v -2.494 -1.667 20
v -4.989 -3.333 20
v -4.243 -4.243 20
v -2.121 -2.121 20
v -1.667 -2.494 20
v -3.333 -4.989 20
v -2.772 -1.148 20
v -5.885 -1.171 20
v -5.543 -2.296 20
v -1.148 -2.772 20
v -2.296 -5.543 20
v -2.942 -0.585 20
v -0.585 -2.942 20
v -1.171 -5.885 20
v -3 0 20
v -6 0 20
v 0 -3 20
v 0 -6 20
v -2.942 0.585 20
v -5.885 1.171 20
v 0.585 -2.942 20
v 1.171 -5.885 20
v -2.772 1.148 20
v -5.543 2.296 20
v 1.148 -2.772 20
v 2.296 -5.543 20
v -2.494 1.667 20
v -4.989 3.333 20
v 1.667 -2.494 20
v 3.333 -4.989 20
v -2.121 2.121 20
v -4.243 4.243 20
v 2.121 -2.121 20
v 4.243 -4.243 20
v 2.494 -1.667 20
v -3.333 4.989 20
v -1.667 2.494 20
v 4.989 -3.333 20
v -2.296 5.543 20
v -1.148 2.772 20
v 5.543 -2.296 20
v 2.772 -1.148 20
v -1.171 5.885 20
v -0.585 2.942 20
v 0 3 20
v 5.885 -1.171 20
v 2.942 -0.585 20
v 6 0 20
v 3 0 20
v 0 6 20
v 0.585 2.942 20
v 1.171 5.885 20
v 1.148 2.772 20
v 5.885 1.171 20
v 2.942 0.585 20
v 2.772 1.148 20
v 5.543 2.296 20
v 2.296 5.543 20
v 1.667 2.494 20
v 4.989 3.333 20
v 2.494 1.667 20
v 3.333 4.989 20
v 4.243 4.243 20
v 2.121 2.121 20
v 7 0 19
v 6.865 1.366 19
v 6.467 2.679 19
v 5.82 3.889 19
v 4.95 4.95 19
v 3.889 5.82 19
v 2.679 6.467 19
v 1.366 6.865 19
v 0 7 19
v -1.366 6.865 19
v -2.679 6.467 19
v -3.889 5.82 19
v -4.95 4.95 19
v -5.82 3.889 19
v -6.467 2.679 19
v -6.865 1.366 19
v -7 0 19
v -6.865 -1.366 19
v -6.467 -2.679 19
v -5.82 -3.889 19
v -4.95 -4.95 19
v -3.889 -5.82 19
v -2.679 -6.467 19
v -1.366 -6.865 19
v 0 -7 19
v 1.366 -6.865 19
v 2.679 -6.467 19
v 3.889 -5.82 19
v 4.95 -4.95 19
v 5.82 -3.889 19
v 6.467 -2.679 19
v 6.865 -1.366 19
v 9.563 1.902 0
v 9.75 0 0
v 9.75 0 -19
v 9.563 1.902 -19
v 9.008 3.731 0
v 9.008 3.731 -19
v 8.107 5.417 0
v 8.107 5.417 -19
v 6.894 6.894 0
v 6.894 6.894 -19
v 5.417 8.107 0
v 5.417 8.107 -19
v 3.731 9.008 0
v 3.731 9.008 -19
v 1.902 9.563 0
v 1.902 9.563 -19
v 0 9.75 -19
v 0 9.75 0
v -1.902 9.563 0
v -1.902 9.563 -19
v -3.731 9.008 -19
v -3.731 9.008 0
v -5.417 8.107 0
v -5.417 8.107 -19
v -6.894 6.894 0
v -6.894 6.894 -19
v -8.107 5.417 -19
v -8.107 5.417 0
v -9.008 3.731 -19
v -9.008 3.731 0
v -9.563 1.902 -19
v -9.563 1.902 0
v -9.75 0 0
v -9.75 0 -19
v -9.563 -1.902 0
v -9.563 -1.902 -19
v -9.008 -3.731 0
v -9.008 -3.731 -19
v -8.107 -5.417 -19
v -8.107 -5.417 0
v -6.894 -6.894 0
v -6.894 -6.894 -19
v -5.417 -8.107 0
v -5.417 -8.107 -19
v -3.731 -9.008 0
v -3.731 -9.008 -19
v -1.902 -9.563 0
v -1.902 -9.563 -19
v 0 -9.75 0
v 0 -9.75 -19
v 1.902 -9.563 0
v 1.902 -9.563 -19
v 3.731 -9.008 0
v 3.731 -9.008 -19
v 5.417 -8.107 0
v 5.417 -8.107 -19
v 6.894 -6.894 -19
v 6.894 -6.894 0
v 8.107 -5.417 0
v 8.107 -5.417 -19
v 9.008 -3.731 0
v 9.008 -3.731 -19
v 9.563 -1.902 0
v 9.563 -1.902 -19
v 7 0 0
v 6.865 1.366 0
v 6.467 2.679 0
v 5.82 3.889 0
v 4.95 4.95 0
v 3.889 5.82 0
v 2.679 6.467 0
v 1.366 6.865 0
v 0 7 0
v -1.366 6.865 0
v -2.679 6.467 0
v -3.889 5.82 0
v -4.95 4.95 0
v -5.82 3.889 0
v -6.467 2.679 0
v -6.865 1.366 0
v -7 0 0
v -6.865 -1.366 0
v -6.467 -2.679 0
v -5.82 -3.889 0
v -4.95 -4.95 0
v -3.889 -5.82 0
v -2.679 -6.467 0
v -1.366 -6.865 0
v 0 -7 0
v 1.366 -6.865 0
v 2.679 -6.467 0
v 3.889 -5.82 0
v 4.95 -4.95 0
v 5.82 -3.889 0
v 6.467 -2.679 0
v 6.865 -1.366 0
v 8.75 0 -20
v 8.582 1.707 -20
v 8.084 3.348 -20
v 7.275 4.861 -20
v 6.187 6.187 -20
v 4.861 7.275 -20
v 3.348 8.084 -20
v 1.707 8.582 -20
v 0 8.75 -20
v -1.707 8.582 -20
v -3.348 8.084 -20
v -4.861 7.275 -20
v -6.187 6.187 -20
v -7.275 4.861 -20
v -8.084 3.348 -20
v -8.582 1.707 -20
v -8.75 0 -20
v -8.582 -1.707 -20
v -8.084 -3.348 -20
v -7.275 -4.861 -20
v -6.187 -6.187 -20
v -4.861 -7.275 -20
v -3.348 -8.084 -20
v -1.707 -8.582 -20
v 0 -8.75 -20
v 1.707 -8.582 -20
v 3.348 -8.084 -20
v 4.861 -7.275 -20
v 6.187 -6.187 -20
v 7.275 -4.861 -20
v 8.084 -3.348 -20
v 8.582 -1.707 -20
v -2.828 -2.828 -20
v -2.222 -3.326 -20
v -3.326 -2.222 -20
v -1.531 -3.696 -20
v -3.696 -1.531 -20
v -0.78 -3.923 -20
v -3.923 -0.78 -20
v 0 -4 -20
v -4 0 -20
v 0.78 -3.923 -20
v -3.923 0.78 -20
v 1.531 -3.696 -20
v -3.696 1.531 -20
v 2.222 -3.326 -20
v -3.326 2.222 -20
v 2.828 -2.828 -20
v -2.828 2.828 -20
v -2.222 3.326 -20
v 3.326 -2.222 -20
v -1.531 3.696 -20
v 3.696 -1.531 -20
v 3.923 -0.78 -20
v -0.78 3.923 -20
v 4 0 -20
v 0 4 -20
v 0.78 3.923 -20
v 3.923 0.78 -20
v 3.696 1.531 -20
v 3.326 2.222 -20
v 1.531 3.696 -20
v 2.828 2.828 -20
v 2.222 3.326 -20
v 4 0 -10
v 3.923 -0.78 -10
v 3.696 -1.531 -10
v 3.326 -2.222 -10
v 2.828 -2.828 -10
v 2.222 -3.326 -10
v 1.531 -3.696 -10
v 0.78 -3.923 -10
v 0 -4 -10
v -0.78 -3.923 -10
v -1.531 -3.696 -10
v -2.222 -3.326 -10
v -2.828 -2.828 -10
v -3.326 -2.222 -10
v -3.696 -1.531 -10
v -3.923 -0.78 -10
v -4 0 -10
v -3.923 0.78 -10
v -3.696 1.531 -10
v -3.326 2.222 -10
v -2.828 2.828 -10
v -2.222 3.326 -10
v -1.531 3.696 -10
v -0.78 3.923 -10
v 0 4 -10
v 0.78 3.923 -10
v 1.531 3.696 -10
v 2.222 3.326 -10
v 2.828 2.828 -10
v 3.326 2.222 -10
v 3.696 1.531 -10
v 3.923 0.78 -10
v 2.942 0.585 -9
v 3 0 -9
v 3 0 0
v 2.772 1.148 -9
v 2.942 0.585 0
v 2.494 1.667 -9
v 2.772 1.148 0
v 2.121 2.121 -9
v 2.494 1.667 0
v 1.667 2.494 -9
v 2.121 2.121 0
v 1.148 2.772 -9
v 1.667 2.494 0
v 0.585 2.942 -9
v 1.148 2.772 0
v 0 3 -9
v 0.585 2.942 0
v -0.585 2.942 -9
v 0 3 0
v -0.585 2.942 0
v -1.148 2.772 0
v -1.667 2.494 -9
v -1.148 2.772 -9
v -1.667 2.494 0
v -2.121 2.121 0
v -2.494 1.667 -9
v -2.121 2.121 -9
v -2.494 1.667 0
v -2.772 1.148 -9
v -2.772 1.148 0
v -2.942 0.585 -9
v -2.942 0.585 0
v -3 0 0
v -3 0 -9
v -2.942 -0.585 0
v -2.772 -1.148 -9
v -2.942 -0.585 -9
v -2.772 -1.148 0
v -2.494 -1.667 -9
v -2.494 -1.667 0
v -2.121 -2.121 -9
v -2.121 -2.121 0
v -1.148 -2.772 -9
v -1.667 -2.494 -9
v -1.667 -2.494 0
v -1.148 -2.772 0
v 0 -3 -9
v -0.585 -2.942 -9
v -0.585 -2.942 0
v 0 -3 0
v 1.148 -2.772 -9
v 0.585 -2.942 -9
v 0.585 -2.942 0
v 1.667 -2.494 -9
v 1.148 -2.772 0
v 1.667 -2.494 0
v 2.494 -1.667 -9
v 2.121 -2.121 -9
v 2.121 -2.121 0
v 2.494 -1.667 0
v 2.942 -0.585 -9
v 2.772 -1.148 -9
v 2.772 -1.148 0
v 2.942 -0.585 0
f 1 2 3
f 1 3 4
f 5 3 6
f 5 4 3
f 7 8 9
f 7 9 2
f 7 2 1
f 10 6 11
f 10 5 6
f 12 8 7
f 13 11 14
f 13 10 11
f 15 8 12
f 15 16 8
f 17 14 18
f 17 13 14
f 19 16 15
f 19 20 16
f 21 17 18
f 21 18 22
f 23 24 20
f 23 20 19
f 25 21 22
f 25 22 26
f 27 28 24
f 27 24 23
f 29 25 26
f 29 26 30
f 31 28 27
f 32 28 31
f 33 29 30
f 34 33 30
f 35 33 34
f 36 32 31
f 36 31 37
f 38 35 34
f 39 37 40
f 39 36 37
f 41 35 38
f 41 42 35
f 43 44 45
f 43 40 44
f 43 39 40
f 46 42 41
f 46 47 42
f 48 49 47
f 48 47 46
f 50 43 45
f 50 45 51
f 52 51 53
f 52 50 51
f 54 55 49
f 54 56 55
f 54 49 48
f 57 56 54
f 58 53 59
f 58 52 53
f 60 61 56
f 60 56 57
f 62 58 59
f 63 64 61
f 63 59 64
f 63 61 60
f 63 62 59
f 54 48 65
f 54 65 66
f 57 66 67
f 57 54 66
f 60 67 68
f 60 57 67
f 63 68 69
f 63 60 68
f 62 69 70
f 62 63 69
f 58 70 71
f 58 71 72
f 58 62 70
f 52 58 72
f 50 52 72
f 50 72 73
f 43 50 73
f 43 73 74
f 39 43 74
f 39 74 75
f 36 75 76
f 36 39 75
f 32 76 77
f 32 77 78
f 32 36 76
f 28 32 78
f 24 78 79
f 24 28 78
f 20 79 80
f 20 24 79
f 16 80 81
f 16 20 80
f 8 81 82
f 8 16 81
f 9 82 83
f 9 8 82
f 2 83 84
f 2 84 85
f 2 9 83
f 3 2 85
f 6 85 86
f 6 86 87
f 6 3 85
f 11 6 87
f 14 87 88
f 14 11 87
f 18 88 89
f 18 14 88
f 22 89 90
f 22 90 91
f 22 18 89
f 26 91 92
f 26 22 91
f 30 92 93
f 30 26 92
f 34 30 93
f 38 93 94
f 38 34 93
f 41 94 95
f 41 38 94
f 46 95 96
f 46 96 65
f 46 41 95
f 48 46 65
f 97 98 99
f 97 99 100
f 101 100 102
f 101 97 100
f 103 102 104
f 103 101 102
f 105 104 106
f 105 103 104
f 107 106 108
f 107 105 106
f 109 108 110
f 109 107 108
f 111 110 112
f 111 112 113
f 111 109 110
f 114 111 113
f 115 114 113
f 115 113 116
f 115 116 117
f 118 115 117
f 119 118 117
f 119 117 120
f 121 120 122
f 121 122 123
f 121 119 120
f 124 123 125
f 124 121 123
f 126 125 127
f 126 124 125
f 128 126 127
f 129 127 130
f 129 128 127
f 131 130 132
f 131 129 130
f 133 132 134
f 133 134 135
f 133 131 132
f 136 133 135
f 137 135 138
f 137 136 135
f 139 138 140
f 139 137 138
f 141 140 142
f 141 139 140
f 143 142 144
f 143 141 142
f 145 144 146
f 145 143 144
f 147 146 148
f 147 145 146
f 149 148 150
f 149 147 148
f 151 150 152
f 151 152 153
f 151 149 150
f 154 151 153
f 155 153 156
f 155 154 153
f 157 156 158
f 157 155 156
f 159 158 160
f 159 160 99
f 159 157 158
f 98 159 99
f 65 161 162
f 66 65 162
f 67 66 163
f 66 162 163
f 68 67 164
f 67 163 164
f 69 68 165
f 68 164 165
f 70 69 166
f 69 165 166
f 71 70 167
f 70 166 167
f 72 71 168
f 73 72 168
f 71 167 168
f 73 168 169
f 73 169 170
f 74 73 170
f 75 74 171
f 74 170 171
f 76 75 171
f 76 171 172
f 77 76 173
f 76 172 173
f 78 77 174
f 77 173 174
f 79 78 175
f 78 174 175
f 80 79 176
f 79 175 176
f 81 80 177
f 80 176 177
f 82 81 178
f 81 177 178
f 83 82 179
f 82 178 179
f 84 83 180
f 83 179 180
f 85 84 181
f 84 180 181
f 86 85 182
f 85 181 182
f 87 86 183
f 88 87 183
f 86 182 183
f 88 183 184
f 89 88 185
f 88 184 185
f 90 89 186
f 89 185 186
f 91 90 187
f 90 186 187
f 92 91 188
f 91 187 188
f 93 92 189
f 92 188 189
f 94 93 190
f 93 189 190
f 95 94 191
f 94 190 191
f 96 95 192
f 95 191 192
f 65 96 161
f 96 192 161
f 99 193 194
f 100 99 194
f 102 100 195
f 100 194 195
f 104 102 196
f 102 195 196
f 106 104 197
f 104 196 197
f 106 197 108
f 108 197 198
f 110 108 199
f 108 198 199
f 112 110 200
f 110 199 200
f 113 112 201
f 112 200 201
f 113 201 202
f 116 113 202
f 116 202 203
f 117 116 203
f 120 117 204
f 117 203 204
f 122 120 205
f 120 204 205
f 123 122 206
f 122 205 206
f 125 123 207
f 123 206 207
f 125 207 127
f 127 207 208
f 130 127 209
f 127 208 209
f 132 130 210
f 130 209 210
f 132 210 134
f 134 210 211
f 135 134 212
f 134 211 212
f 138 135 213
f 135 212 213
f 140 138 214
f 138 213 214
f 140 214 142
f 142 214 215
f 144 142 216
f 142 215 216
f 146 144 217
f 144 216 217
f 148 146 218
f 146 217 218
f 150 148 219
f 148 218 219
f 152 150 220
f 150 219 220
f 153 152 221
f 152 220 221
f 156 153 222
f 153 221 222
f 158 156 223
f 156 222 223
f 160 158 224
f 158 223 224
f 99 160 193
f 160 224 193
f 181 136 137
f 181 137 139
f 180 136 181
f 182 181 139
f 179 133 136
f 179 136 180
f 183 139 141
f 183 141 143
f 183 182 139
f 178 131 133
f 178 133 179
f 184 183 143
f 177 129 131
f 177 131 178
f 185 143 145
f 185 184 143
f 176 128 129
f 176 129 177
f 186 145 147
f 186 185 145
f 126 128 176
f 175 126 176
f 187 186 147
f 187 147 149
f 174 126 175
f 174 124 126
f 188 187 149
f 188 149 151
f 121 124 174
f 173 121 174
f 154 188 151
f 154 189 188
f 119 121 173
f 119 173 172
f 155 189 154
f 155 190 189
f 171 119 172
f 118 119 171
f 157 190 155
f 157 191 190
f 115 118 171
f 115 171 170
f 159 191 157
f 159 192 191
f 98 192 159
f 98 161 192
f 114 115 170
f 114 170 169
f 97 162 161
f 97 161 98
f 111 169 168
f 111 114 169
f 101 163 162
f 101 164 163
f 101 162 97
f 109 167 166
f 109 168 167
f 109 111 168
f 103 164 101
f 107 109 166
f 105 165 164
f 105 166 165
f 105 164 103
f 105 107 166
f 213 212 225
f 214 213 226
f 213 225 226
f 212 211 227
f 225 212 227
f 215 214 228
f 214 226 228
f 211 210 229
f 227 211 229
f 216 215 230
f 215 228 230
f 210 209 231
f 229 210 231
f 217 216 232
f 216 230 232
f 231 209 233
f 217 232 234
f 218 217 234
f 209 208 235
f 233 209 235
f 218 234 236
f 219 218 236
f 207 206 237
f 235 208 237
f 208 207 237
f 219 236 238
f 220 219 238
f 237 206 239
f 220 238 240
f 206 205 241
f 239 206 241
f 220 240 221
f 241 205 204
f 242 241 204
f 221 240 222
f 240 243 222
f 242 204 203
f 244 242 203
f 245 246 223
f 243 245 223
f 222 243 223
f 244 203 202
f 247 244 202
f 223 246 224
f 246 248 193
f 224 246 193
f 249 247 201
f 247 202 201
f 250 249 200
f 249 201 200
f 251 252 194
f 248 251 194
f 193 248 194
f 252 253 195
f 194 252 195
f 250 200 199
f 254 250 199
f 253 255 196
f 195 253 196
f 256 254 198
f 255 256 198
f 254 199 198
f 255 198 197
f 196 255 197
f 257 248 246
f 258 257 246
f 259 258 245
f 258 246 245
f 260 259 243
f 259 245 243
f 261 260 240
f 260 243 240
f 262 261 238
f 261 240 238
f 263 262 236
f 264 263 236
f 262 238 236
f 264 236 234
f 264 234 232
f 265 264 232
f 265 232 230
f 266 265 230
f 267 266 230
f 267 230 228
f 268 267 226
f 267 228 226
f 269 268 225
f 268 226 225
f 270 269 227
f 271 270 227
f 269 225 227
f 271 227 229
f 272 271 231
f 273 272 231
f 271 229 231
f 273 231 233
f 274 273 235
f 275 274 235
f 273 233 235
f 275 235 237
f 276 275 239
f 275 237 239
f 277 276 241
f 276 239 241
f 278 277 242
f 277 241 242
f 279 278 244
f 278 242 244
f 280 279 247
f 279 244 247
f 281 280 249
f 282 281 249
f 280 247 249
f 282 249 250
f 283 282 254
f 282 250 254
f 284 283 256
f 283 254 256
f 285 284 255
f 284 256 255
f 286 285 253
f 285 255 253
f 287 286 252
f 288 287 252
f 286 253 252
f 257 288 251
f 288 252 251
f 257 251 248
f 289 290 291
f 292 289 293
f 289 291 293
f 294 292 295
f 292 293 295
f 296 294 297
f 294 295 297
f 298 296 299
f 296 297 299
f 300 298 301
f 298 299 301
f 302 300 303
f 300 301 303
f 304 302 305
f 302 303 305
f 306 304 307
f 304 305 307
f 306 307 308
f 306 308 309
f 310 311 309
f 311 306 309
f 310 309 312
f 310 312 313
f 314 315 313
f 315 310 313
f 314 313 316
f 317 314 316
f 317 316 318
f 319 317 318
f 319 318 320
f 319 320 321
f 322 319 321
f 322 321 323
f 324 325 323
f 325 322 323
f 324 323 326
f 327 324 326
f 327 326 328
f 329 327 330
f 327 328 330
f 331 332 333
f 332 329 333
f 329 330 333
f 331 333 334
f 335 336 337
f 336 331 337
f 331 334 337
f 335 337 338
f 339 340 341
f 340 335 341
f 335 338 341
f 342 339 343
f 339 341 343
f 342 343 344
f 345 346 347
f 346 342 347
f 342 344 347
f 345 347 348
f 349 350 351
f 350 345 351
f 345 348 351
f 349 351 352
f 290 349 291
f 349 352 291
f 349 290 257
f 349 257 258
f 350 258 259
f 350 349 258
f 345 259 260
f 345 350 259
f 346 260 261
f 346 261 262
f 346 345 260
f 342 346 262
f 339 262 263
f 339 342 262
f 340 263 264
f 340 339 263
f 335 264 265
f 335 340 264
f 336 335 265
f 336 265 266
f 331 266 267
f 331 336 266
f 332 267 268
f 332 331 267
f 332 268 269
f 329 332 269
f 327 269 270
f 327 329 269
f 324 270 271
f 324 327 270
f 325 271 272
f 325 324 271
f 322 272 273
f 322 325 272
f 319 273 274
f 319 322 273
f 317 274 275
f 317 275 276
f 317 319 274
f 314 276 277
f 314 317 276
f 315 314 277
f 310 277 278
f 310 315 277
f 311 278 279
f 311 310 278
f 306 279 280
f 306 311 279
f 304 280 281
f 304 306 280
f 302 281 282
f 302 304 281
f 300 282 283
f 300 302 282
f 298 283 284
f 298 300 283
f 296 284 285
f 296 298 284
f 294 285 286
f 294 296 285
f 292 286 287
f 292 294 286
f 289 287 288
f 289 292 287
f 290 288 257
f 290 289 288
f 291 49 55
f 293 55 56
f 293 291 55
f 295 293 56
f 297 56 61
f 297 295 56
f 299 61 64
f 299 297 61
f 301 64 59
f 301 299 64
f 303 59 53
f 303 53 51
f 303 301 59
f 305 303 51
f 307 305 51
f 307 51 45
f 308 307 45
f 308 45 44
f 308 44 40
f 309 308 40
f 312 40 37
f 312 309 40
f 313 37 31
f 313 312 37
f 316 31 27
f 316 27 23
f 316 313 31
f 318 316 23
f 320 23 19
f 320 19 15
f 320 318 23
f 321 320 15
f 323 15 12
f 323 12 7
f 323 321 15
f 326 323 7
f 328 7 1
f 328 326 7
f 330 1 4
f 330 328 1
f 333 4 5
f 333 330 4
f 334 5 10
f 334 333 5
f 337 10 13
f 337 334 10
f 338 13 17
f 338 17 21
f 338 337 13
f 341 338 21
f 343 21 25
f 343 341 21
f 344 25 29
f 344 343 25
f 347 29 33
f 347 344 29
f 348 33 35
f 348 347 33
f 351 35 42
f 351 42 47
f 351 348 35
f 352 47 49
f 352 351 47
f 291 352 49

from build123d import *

# Parameters (mm, degrees)
F0_R     = 7
F0_R_2   = 3
F1_DEPTH = 20
F0_R_3   = 9.75
F2_DEPTH = 20
F3_R     = 4
F3_R_2   = 3
F4_DEPTH = 10
F5_SIZE  = 0.99999


# Not quite as in the source:
# - a fillet or chamfer is up to 0.001 mm smaller than in the source, because OpenCascade refuses the exact size


with BuildPart() as f1:
    # F0 (on Top) → F1 (new body)
    with BuildSketch(Plane.XY):
        Circle(F0_R)
        Circle(F0_R_2, mode=Mode.SUBTRACT)
    extrude(amount=F1_DEPTH)

    # F0 (on Top) → F2 (join)
    with BuildSketch(Plane.XY):
        Circle(F0_R_3)
        Circle(F0_R, mode=Mode.SUBTRACT)
        Circle(F0_R)
        Circle(F0_R_2, mode=Mode.SUBTRACT)
    extrude(amount=-F2_DEPTH)

    # F3 (on face) → F4 (cut)
    with BuildSketch(Plane(origin=(0, 0, -20), x_dir=(1, 0, 0), z_dir=(0, 0, -1))):
        Circle(F3_R)
        Circle(F3_R_2, mode=Mode.SUBTRACT)
    extrude(amount=-F4_DEPTH, mode=Mode.SUBTRACT)

    # F5 (size 1 in the source; OpenCascade refuses exactly that, so slightly less here)
    f5_edges = [f1.edges().sort_by_distance(p)[0] for p in [
        (-9.75, 0, -20),
        (-7, 0, 20),
        (-3, 0, -10),
    ]]
    chamfer(f5_edges, length=F5_SIZE)


solid = f1.part
